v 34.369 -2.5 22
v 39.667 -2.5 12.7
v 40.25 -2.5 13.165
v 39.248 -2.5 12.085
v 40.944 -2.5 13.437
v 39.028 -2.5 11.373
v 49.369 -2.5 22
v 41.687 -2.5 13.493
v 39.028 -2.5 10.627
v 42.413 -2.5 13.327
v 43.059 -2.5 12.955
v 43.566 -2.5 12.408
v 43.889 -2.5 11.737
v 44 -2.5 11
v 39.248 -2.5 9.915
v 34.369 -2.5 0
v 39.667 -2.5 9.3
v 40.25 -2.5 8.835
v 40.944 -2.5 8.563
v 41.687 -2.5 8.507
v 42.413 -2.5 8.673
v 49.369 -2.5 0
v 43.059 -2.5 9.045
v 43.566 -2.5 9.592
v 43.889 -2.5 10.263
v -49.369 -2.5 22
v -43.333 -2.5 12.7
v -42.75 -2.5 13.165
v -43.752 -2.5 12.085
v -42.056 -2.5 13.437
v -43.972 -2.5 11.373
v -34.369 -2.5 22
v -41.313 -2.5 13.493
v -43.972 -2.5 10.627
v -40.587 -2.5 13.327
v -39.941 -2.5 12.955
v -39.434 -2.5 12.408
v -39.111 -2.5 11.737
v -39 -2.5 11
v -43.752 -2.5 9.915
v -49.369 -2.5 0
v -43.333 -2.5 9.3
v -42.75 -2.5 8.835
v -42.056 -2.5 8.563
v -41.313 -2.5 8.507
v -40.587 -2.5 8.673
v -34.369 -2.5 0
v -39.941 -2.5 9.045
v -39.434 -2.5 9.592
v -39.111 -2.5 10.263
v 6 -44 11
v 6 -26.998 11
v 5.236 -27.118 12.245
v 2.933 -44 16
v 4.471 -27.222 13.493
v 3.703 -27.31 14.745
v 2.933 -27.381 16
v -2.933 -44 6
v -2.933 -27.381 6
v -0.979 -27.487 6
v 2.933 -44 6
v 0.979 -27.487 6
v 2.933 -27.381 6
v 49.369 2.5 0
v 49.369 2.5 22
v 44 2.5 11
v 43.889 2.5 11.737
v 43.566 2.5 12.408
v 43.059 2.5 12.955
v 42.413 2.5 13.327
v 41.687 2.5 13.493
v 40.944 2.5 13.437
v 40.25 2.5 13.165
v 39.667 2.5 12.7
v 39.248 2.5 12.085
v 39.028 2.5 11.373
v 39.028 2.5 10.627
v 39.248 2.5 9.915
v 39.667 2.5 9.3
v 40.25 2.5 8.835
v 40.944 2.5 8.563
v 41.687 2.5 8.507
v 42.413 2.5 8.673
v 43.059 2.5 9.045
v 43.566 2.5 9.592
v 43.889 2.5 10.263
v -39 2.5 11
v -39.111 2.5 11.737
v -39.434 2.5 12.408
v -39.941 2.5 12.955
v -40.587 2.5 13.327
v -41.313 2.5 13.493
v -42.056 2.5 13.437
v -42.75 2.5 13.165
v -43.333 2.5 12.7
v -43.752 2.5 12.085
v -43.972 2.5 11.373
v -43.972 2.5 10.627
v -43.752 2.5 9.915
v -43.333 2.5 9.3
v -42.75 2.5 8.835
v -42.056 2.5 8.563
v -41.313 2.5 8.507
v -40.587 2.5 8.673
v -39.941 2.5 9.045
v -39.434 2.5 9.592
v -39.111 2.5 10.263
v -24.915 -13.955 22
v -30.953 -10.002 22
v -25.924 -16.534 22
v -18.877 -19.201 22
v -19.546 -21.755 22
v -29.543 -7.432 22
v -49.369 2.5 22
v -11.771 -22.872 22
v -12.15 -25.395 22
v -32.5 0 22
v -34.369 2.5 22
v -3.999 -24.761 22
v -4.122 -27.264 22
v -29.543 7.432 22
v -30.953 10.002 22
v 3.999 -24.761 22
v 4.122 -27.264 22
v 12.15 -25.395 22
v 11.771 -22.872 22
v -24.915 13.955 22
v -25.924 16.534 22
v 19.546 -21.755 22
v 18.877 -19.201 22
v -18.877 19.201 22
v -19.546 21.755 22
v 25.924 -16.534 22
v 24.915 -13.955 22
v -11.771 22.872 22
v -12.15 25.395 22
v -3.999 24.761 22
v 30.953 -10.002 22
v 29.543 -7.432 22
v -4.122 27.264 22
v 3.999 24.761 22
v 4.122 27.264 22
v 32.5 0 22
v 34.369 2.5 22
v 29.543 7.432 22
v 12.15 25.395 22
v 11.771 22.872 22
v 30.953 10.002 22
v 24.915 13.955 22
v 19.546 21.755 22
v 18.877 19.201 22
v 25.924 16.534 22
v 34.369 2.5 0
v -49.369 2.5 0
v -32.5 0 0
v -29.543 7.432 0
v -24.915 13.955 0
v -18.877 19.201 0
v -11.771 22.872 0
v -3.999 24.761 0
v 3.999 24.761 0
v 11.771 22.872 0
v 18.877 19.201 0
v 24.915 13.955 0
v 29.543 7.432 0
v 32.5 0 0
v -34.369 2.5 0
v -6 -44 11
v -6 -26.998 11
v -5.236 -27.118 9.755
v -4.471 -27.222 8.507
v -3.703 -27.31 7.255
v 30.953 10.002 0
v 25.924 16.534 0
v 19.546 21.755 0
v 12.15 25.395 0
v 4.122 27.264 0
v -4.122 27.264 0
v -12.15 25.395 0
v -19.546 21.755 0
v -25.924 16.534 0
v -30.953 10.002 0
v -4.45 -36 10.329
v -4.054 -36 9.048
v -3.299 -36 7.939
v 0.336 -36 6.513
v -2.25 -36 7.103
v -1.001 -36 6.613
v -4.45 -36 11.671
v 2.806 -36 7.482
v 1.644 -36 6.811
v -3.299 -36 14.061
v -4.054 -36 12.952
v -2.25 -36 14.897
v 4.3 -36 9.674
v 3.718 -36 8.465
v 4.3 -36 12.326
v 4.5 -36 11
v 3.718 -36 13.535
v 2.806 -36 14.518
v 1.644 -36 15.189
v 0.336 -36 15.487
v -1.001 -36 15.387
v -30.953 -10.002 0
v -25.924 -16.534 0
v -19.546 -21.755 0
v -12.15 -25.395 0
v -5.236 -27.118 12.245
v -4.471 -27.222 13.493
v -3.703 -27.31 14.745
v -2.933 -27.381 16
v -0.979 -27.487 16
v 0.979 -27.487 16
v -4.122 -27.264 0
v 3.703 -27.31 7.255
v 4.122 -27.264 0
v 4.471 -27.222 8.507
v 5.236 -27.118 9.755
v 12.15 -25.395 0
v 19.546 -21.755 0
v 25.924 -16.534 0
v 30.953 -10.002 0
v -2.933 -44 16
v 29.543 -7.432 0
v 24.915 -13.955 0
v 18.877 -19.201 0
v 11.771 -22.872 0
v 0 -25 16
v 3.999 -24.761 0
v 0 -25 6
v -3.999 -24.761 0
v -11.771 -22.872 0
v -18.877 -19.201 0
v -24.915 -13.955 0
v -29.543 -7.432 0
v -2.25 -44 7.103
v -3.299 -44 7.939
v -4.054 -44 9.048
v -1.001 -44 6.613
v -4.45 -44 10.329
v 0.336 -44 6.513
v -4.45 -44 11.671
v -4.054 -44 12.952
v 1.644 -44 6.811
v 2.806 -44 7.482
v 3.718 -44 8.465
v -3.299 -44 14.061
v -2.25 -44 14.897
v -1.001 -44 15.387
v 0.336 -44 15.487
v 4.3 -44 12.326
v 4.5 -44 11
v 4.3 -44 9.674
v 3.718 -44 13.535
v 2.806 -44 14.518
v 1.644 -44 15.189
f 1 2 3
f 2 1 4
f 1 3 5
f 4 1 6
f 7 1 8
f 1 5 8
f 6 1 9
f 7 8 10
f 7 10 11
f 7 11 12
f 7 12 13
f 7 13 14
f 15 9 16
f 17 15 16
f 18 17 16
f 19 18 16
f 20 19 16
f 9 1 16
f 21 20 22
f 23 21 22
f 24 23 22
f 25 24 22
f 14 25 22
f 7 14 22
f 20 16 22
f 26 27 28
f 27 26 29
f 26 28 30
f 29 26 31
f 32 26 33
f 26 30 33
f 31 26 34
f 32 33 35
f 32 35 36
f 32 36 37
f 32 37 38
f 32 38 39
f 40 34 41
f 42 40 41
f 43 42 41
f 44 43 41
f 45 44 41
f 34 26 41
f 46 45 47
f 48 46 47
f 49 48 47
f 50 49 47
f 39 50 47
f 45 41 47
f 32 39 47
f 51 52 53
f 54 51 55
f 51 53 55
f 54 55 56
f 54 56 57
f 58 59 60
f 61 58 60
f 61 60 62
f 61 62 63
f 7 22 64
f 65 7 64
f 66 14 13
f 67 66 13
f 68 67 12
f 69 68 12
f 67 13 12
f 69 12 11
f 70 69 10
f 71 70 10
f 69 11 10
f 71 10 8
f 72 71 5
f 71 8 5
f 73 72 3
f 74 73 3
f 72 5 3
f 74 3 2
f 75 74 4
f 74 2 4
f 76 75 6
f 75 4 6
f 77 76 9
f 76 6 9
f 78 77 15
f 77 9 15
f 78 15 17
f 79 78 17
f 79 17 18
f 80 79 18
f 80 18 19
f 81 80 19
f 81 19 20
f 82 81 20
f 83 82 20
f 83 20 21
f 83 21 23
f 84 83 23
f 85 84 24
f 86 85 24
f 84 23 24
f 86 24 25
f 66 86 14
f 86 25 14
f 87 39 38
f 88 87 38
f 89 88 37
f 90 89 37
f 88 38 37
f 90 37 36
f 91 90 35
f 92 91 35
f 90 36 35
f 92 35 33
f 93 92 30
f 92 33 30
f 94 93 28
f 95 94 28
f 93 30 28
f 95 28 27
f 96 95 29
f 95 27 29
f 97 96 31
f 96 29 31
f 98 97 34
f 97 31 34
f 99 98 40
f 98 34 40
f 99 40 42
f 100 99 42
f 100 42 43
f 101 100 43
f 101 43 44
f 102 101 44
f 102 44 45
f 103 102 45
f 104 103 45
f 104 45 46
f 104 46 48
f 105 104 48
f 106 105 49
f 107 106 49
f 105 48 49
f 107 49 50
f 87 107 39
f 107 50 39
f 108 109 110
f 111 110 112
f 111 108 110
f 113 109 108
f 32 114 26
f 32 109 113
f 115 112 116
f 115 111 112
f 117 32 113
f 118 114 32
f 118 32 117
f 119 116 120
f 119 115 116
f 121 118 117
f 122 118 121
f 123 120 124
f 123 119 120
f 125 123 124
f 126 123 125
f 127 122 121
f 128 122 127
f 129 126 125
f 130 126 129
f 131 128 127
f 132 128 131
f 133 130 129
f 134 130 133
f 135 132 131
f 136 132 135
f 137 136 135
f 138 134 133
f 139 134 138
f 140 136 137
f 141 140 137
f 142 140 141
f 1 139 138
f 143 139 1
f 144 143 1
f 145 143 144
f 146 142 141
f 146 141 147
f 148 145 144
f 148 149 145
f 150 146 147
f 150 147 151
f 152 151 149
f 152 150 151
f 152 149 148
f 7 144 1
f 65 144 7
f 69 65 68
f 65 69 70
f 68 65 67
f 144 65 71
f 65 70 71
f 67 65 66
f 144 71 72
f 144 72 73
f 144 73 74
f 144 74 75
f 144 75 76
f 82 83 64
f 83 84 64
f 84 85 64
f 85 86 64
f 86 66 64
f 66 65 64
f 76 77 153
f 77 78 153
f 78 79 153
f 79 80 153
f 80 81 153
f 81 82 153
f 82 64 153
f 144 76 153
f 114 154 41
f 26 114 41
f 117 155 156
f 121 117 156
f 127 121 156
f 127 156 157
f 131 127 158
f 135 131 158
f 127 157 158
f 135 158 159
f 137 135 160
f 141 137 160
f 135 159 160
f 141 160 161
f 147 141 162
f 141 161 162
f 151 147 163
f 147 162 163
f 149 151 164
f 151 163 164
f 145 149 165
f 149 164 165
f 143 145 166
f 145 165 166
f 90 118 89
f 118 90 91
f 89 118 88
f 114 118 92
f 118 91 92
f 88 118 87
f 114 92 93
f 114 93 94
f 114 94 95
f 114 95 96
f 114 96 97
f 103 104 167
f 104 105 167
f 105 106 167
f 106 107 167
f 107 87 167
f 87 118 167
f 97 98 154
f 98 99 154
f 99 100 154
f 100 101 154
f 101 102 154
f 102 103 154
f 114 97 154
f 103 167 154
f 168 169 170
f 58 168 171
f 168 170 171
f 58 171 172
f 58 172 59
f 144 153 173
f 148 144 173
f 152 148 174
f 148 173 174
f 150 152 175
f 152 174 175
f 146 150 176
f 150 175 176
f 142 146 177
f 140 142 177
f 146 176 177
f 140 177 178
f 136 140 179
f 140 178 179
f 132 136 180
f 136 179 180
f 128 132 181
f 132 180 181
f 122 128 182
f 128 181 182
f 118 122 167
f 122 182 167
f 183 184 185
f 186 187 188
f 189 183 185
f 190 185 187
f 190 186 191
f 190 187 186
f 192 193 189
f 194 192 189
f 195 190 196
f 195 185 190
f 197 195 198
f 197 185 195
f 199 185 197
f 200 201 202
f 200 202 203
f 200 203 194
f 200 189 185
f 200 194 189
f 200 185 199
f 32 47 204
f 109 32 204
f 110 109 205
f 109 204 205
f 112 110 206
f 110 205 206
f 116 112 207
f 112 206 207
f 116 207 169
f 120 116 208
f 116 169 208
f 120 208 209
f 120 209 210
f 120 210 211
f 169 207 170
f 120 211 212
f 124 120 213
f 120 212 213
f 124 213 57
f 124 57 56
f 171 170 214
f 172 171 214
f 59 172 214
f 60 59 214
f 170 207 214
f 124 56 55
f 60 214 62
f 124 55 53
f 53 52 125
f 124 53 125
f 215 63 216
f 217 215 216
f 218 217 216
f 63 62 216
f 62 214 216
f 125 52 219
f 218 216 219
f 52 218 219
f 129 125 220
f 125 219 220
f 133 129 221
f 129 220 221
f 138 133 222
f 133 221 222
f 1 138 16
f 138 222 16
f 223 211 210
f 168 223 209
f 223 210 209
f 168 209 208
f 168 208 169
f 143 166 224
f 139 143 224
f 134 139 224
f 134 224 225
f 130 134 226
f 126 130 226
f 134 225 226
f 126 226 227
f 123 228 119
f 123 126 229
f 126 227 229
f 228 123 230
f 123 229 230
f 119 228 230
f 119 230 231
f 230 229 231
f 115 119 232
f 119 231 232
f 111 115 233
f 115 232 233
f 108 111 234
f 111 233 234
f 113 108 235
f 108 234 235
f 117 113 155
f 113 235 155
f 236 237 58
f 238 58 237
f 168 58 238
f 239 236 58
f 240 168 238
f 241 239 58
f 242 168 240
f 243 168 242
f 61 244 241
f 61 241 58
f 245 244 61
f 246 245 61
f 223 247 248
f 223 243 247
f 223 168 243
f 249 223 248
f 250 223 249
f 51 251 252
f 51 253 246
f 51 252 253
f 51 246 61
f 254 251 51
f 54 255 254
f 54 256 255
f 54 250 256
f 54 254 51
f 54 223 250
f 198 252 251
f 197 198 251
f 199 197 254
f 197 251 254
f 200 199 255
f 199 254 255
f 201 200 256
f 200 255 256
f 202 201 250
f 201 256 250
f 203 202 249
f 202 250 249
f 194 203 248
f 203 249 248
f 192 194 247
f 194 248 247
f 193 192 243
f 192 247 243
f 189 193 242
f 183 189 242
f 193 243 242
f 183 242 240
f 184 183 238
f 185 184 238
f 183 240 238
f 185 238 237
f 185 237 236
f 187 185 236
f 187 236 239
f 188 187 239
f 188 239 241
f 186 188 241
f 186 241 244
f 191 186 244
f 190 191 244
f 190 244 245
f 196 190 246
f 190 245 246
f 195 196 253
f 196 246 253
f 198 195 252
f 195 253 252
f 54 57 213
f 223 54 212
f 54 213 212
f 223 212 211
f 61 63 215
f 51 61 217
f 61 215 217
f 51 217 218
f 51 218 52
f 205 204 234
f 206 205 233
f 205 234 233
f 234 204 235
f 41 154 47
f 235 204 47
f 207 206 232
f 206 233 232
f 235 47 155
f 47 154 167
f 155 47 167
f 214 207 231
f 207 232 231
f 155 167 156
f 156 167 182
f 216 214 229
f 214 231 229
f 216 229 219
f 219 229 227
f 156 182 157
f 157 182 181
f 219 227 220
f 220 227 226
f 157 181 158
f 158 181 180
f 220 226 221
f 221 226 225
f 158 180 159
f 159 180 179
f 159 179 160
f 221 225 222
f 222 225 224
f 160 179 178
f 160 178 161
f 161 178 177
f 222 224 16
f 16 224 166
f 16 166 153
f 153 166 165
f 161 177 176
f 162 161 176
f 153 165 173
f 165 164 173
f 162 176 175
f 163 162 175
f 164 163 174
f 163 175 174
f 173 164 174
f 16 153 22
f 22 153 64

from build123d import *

# Parameters (mm, degrees)
F1_DEPTH = 22
F4_DEPTH = 19
F5_R     = 2.5
F6_DEPTH = 5
F7_R     = 4.5
F8_DEPTH = 8


with BuildPart() as f1:
    # F0 (on Top) → F1 (new body)
    with BuildSketch(Plane.XY):
        with BuildLine():
            ThreePointArc((-32.5, 0), (0, 25), (32.5, 0))
            Line((32.5, 0), (49.369318, 0))
            Line((49.369318, 0), (49.369318, 2.5))
            Line((49.369318, 2.5), (34.369318, 2.5))
            ThreePointArc((34.369318, 2.5), (0, 27.5), (-34.369318, 2.5))
            Line((-34.369318, 2.5), (-49.369318, 2.5))
            Line((-49.369318, 2.5), (-49.369318, 0))
            Line((-49.369318, 0), (-32.5, 0))
        make_face()
        with BuildLine():
            Line((49.369318, 0), (32.5, 0))
            ThreePointArc((32.5, 0), (0, -25), (-32.5, 0))
            Line((-32.5, 0), (-49.369318, 0))
            Line((-49.369318, 0), (-49.369318, -2.5))
            Line((-49.369318, -2.5), (-34.369318, -2.5))
            ThreePointArc((-34.369318, -2.5), (0, -27.5), (34.369318, -2.5))
            Line((34.369318, -2.5), (49.369318, -2.5))
            Line((49.369318, -2.5), (49.369318, 0))
        make_face()
    extrude(amount=F1_DEPTH)

    # F3 (on offset) → F4 (join)
    with BuildSketch(Plane.XZ.offset(25)):
        Polygon((6, 11), (2.932883, 16), (-2.932883, 16), (-6, 11), (-2.932883, 6), (2.932883, 6), align=None)
    extrude(amount=F4_DEPTH)

    # F5 (on face) → F6 (cut, through all)
    with BuildSketch(Plane.XZ.offset(2.5)):
        with Locations((41.5, 11)):
            Circle(F5_R)
        with Locations((-41.5, 11)):
            Circle(F5_R)
    extrude(amount=-F6_DEPTH, mode=Mode.SUBTRACT)

    # F7 (on face) → F8 (cut)
    with BuildSketch(Plane.XZ.offset(44)):
        with Locations((0, 11)):
            Circle(F7_R)
    extrude(amount=-F8_DEPTH, mode=Mode.SUBTRACT)


solid = f1.part
